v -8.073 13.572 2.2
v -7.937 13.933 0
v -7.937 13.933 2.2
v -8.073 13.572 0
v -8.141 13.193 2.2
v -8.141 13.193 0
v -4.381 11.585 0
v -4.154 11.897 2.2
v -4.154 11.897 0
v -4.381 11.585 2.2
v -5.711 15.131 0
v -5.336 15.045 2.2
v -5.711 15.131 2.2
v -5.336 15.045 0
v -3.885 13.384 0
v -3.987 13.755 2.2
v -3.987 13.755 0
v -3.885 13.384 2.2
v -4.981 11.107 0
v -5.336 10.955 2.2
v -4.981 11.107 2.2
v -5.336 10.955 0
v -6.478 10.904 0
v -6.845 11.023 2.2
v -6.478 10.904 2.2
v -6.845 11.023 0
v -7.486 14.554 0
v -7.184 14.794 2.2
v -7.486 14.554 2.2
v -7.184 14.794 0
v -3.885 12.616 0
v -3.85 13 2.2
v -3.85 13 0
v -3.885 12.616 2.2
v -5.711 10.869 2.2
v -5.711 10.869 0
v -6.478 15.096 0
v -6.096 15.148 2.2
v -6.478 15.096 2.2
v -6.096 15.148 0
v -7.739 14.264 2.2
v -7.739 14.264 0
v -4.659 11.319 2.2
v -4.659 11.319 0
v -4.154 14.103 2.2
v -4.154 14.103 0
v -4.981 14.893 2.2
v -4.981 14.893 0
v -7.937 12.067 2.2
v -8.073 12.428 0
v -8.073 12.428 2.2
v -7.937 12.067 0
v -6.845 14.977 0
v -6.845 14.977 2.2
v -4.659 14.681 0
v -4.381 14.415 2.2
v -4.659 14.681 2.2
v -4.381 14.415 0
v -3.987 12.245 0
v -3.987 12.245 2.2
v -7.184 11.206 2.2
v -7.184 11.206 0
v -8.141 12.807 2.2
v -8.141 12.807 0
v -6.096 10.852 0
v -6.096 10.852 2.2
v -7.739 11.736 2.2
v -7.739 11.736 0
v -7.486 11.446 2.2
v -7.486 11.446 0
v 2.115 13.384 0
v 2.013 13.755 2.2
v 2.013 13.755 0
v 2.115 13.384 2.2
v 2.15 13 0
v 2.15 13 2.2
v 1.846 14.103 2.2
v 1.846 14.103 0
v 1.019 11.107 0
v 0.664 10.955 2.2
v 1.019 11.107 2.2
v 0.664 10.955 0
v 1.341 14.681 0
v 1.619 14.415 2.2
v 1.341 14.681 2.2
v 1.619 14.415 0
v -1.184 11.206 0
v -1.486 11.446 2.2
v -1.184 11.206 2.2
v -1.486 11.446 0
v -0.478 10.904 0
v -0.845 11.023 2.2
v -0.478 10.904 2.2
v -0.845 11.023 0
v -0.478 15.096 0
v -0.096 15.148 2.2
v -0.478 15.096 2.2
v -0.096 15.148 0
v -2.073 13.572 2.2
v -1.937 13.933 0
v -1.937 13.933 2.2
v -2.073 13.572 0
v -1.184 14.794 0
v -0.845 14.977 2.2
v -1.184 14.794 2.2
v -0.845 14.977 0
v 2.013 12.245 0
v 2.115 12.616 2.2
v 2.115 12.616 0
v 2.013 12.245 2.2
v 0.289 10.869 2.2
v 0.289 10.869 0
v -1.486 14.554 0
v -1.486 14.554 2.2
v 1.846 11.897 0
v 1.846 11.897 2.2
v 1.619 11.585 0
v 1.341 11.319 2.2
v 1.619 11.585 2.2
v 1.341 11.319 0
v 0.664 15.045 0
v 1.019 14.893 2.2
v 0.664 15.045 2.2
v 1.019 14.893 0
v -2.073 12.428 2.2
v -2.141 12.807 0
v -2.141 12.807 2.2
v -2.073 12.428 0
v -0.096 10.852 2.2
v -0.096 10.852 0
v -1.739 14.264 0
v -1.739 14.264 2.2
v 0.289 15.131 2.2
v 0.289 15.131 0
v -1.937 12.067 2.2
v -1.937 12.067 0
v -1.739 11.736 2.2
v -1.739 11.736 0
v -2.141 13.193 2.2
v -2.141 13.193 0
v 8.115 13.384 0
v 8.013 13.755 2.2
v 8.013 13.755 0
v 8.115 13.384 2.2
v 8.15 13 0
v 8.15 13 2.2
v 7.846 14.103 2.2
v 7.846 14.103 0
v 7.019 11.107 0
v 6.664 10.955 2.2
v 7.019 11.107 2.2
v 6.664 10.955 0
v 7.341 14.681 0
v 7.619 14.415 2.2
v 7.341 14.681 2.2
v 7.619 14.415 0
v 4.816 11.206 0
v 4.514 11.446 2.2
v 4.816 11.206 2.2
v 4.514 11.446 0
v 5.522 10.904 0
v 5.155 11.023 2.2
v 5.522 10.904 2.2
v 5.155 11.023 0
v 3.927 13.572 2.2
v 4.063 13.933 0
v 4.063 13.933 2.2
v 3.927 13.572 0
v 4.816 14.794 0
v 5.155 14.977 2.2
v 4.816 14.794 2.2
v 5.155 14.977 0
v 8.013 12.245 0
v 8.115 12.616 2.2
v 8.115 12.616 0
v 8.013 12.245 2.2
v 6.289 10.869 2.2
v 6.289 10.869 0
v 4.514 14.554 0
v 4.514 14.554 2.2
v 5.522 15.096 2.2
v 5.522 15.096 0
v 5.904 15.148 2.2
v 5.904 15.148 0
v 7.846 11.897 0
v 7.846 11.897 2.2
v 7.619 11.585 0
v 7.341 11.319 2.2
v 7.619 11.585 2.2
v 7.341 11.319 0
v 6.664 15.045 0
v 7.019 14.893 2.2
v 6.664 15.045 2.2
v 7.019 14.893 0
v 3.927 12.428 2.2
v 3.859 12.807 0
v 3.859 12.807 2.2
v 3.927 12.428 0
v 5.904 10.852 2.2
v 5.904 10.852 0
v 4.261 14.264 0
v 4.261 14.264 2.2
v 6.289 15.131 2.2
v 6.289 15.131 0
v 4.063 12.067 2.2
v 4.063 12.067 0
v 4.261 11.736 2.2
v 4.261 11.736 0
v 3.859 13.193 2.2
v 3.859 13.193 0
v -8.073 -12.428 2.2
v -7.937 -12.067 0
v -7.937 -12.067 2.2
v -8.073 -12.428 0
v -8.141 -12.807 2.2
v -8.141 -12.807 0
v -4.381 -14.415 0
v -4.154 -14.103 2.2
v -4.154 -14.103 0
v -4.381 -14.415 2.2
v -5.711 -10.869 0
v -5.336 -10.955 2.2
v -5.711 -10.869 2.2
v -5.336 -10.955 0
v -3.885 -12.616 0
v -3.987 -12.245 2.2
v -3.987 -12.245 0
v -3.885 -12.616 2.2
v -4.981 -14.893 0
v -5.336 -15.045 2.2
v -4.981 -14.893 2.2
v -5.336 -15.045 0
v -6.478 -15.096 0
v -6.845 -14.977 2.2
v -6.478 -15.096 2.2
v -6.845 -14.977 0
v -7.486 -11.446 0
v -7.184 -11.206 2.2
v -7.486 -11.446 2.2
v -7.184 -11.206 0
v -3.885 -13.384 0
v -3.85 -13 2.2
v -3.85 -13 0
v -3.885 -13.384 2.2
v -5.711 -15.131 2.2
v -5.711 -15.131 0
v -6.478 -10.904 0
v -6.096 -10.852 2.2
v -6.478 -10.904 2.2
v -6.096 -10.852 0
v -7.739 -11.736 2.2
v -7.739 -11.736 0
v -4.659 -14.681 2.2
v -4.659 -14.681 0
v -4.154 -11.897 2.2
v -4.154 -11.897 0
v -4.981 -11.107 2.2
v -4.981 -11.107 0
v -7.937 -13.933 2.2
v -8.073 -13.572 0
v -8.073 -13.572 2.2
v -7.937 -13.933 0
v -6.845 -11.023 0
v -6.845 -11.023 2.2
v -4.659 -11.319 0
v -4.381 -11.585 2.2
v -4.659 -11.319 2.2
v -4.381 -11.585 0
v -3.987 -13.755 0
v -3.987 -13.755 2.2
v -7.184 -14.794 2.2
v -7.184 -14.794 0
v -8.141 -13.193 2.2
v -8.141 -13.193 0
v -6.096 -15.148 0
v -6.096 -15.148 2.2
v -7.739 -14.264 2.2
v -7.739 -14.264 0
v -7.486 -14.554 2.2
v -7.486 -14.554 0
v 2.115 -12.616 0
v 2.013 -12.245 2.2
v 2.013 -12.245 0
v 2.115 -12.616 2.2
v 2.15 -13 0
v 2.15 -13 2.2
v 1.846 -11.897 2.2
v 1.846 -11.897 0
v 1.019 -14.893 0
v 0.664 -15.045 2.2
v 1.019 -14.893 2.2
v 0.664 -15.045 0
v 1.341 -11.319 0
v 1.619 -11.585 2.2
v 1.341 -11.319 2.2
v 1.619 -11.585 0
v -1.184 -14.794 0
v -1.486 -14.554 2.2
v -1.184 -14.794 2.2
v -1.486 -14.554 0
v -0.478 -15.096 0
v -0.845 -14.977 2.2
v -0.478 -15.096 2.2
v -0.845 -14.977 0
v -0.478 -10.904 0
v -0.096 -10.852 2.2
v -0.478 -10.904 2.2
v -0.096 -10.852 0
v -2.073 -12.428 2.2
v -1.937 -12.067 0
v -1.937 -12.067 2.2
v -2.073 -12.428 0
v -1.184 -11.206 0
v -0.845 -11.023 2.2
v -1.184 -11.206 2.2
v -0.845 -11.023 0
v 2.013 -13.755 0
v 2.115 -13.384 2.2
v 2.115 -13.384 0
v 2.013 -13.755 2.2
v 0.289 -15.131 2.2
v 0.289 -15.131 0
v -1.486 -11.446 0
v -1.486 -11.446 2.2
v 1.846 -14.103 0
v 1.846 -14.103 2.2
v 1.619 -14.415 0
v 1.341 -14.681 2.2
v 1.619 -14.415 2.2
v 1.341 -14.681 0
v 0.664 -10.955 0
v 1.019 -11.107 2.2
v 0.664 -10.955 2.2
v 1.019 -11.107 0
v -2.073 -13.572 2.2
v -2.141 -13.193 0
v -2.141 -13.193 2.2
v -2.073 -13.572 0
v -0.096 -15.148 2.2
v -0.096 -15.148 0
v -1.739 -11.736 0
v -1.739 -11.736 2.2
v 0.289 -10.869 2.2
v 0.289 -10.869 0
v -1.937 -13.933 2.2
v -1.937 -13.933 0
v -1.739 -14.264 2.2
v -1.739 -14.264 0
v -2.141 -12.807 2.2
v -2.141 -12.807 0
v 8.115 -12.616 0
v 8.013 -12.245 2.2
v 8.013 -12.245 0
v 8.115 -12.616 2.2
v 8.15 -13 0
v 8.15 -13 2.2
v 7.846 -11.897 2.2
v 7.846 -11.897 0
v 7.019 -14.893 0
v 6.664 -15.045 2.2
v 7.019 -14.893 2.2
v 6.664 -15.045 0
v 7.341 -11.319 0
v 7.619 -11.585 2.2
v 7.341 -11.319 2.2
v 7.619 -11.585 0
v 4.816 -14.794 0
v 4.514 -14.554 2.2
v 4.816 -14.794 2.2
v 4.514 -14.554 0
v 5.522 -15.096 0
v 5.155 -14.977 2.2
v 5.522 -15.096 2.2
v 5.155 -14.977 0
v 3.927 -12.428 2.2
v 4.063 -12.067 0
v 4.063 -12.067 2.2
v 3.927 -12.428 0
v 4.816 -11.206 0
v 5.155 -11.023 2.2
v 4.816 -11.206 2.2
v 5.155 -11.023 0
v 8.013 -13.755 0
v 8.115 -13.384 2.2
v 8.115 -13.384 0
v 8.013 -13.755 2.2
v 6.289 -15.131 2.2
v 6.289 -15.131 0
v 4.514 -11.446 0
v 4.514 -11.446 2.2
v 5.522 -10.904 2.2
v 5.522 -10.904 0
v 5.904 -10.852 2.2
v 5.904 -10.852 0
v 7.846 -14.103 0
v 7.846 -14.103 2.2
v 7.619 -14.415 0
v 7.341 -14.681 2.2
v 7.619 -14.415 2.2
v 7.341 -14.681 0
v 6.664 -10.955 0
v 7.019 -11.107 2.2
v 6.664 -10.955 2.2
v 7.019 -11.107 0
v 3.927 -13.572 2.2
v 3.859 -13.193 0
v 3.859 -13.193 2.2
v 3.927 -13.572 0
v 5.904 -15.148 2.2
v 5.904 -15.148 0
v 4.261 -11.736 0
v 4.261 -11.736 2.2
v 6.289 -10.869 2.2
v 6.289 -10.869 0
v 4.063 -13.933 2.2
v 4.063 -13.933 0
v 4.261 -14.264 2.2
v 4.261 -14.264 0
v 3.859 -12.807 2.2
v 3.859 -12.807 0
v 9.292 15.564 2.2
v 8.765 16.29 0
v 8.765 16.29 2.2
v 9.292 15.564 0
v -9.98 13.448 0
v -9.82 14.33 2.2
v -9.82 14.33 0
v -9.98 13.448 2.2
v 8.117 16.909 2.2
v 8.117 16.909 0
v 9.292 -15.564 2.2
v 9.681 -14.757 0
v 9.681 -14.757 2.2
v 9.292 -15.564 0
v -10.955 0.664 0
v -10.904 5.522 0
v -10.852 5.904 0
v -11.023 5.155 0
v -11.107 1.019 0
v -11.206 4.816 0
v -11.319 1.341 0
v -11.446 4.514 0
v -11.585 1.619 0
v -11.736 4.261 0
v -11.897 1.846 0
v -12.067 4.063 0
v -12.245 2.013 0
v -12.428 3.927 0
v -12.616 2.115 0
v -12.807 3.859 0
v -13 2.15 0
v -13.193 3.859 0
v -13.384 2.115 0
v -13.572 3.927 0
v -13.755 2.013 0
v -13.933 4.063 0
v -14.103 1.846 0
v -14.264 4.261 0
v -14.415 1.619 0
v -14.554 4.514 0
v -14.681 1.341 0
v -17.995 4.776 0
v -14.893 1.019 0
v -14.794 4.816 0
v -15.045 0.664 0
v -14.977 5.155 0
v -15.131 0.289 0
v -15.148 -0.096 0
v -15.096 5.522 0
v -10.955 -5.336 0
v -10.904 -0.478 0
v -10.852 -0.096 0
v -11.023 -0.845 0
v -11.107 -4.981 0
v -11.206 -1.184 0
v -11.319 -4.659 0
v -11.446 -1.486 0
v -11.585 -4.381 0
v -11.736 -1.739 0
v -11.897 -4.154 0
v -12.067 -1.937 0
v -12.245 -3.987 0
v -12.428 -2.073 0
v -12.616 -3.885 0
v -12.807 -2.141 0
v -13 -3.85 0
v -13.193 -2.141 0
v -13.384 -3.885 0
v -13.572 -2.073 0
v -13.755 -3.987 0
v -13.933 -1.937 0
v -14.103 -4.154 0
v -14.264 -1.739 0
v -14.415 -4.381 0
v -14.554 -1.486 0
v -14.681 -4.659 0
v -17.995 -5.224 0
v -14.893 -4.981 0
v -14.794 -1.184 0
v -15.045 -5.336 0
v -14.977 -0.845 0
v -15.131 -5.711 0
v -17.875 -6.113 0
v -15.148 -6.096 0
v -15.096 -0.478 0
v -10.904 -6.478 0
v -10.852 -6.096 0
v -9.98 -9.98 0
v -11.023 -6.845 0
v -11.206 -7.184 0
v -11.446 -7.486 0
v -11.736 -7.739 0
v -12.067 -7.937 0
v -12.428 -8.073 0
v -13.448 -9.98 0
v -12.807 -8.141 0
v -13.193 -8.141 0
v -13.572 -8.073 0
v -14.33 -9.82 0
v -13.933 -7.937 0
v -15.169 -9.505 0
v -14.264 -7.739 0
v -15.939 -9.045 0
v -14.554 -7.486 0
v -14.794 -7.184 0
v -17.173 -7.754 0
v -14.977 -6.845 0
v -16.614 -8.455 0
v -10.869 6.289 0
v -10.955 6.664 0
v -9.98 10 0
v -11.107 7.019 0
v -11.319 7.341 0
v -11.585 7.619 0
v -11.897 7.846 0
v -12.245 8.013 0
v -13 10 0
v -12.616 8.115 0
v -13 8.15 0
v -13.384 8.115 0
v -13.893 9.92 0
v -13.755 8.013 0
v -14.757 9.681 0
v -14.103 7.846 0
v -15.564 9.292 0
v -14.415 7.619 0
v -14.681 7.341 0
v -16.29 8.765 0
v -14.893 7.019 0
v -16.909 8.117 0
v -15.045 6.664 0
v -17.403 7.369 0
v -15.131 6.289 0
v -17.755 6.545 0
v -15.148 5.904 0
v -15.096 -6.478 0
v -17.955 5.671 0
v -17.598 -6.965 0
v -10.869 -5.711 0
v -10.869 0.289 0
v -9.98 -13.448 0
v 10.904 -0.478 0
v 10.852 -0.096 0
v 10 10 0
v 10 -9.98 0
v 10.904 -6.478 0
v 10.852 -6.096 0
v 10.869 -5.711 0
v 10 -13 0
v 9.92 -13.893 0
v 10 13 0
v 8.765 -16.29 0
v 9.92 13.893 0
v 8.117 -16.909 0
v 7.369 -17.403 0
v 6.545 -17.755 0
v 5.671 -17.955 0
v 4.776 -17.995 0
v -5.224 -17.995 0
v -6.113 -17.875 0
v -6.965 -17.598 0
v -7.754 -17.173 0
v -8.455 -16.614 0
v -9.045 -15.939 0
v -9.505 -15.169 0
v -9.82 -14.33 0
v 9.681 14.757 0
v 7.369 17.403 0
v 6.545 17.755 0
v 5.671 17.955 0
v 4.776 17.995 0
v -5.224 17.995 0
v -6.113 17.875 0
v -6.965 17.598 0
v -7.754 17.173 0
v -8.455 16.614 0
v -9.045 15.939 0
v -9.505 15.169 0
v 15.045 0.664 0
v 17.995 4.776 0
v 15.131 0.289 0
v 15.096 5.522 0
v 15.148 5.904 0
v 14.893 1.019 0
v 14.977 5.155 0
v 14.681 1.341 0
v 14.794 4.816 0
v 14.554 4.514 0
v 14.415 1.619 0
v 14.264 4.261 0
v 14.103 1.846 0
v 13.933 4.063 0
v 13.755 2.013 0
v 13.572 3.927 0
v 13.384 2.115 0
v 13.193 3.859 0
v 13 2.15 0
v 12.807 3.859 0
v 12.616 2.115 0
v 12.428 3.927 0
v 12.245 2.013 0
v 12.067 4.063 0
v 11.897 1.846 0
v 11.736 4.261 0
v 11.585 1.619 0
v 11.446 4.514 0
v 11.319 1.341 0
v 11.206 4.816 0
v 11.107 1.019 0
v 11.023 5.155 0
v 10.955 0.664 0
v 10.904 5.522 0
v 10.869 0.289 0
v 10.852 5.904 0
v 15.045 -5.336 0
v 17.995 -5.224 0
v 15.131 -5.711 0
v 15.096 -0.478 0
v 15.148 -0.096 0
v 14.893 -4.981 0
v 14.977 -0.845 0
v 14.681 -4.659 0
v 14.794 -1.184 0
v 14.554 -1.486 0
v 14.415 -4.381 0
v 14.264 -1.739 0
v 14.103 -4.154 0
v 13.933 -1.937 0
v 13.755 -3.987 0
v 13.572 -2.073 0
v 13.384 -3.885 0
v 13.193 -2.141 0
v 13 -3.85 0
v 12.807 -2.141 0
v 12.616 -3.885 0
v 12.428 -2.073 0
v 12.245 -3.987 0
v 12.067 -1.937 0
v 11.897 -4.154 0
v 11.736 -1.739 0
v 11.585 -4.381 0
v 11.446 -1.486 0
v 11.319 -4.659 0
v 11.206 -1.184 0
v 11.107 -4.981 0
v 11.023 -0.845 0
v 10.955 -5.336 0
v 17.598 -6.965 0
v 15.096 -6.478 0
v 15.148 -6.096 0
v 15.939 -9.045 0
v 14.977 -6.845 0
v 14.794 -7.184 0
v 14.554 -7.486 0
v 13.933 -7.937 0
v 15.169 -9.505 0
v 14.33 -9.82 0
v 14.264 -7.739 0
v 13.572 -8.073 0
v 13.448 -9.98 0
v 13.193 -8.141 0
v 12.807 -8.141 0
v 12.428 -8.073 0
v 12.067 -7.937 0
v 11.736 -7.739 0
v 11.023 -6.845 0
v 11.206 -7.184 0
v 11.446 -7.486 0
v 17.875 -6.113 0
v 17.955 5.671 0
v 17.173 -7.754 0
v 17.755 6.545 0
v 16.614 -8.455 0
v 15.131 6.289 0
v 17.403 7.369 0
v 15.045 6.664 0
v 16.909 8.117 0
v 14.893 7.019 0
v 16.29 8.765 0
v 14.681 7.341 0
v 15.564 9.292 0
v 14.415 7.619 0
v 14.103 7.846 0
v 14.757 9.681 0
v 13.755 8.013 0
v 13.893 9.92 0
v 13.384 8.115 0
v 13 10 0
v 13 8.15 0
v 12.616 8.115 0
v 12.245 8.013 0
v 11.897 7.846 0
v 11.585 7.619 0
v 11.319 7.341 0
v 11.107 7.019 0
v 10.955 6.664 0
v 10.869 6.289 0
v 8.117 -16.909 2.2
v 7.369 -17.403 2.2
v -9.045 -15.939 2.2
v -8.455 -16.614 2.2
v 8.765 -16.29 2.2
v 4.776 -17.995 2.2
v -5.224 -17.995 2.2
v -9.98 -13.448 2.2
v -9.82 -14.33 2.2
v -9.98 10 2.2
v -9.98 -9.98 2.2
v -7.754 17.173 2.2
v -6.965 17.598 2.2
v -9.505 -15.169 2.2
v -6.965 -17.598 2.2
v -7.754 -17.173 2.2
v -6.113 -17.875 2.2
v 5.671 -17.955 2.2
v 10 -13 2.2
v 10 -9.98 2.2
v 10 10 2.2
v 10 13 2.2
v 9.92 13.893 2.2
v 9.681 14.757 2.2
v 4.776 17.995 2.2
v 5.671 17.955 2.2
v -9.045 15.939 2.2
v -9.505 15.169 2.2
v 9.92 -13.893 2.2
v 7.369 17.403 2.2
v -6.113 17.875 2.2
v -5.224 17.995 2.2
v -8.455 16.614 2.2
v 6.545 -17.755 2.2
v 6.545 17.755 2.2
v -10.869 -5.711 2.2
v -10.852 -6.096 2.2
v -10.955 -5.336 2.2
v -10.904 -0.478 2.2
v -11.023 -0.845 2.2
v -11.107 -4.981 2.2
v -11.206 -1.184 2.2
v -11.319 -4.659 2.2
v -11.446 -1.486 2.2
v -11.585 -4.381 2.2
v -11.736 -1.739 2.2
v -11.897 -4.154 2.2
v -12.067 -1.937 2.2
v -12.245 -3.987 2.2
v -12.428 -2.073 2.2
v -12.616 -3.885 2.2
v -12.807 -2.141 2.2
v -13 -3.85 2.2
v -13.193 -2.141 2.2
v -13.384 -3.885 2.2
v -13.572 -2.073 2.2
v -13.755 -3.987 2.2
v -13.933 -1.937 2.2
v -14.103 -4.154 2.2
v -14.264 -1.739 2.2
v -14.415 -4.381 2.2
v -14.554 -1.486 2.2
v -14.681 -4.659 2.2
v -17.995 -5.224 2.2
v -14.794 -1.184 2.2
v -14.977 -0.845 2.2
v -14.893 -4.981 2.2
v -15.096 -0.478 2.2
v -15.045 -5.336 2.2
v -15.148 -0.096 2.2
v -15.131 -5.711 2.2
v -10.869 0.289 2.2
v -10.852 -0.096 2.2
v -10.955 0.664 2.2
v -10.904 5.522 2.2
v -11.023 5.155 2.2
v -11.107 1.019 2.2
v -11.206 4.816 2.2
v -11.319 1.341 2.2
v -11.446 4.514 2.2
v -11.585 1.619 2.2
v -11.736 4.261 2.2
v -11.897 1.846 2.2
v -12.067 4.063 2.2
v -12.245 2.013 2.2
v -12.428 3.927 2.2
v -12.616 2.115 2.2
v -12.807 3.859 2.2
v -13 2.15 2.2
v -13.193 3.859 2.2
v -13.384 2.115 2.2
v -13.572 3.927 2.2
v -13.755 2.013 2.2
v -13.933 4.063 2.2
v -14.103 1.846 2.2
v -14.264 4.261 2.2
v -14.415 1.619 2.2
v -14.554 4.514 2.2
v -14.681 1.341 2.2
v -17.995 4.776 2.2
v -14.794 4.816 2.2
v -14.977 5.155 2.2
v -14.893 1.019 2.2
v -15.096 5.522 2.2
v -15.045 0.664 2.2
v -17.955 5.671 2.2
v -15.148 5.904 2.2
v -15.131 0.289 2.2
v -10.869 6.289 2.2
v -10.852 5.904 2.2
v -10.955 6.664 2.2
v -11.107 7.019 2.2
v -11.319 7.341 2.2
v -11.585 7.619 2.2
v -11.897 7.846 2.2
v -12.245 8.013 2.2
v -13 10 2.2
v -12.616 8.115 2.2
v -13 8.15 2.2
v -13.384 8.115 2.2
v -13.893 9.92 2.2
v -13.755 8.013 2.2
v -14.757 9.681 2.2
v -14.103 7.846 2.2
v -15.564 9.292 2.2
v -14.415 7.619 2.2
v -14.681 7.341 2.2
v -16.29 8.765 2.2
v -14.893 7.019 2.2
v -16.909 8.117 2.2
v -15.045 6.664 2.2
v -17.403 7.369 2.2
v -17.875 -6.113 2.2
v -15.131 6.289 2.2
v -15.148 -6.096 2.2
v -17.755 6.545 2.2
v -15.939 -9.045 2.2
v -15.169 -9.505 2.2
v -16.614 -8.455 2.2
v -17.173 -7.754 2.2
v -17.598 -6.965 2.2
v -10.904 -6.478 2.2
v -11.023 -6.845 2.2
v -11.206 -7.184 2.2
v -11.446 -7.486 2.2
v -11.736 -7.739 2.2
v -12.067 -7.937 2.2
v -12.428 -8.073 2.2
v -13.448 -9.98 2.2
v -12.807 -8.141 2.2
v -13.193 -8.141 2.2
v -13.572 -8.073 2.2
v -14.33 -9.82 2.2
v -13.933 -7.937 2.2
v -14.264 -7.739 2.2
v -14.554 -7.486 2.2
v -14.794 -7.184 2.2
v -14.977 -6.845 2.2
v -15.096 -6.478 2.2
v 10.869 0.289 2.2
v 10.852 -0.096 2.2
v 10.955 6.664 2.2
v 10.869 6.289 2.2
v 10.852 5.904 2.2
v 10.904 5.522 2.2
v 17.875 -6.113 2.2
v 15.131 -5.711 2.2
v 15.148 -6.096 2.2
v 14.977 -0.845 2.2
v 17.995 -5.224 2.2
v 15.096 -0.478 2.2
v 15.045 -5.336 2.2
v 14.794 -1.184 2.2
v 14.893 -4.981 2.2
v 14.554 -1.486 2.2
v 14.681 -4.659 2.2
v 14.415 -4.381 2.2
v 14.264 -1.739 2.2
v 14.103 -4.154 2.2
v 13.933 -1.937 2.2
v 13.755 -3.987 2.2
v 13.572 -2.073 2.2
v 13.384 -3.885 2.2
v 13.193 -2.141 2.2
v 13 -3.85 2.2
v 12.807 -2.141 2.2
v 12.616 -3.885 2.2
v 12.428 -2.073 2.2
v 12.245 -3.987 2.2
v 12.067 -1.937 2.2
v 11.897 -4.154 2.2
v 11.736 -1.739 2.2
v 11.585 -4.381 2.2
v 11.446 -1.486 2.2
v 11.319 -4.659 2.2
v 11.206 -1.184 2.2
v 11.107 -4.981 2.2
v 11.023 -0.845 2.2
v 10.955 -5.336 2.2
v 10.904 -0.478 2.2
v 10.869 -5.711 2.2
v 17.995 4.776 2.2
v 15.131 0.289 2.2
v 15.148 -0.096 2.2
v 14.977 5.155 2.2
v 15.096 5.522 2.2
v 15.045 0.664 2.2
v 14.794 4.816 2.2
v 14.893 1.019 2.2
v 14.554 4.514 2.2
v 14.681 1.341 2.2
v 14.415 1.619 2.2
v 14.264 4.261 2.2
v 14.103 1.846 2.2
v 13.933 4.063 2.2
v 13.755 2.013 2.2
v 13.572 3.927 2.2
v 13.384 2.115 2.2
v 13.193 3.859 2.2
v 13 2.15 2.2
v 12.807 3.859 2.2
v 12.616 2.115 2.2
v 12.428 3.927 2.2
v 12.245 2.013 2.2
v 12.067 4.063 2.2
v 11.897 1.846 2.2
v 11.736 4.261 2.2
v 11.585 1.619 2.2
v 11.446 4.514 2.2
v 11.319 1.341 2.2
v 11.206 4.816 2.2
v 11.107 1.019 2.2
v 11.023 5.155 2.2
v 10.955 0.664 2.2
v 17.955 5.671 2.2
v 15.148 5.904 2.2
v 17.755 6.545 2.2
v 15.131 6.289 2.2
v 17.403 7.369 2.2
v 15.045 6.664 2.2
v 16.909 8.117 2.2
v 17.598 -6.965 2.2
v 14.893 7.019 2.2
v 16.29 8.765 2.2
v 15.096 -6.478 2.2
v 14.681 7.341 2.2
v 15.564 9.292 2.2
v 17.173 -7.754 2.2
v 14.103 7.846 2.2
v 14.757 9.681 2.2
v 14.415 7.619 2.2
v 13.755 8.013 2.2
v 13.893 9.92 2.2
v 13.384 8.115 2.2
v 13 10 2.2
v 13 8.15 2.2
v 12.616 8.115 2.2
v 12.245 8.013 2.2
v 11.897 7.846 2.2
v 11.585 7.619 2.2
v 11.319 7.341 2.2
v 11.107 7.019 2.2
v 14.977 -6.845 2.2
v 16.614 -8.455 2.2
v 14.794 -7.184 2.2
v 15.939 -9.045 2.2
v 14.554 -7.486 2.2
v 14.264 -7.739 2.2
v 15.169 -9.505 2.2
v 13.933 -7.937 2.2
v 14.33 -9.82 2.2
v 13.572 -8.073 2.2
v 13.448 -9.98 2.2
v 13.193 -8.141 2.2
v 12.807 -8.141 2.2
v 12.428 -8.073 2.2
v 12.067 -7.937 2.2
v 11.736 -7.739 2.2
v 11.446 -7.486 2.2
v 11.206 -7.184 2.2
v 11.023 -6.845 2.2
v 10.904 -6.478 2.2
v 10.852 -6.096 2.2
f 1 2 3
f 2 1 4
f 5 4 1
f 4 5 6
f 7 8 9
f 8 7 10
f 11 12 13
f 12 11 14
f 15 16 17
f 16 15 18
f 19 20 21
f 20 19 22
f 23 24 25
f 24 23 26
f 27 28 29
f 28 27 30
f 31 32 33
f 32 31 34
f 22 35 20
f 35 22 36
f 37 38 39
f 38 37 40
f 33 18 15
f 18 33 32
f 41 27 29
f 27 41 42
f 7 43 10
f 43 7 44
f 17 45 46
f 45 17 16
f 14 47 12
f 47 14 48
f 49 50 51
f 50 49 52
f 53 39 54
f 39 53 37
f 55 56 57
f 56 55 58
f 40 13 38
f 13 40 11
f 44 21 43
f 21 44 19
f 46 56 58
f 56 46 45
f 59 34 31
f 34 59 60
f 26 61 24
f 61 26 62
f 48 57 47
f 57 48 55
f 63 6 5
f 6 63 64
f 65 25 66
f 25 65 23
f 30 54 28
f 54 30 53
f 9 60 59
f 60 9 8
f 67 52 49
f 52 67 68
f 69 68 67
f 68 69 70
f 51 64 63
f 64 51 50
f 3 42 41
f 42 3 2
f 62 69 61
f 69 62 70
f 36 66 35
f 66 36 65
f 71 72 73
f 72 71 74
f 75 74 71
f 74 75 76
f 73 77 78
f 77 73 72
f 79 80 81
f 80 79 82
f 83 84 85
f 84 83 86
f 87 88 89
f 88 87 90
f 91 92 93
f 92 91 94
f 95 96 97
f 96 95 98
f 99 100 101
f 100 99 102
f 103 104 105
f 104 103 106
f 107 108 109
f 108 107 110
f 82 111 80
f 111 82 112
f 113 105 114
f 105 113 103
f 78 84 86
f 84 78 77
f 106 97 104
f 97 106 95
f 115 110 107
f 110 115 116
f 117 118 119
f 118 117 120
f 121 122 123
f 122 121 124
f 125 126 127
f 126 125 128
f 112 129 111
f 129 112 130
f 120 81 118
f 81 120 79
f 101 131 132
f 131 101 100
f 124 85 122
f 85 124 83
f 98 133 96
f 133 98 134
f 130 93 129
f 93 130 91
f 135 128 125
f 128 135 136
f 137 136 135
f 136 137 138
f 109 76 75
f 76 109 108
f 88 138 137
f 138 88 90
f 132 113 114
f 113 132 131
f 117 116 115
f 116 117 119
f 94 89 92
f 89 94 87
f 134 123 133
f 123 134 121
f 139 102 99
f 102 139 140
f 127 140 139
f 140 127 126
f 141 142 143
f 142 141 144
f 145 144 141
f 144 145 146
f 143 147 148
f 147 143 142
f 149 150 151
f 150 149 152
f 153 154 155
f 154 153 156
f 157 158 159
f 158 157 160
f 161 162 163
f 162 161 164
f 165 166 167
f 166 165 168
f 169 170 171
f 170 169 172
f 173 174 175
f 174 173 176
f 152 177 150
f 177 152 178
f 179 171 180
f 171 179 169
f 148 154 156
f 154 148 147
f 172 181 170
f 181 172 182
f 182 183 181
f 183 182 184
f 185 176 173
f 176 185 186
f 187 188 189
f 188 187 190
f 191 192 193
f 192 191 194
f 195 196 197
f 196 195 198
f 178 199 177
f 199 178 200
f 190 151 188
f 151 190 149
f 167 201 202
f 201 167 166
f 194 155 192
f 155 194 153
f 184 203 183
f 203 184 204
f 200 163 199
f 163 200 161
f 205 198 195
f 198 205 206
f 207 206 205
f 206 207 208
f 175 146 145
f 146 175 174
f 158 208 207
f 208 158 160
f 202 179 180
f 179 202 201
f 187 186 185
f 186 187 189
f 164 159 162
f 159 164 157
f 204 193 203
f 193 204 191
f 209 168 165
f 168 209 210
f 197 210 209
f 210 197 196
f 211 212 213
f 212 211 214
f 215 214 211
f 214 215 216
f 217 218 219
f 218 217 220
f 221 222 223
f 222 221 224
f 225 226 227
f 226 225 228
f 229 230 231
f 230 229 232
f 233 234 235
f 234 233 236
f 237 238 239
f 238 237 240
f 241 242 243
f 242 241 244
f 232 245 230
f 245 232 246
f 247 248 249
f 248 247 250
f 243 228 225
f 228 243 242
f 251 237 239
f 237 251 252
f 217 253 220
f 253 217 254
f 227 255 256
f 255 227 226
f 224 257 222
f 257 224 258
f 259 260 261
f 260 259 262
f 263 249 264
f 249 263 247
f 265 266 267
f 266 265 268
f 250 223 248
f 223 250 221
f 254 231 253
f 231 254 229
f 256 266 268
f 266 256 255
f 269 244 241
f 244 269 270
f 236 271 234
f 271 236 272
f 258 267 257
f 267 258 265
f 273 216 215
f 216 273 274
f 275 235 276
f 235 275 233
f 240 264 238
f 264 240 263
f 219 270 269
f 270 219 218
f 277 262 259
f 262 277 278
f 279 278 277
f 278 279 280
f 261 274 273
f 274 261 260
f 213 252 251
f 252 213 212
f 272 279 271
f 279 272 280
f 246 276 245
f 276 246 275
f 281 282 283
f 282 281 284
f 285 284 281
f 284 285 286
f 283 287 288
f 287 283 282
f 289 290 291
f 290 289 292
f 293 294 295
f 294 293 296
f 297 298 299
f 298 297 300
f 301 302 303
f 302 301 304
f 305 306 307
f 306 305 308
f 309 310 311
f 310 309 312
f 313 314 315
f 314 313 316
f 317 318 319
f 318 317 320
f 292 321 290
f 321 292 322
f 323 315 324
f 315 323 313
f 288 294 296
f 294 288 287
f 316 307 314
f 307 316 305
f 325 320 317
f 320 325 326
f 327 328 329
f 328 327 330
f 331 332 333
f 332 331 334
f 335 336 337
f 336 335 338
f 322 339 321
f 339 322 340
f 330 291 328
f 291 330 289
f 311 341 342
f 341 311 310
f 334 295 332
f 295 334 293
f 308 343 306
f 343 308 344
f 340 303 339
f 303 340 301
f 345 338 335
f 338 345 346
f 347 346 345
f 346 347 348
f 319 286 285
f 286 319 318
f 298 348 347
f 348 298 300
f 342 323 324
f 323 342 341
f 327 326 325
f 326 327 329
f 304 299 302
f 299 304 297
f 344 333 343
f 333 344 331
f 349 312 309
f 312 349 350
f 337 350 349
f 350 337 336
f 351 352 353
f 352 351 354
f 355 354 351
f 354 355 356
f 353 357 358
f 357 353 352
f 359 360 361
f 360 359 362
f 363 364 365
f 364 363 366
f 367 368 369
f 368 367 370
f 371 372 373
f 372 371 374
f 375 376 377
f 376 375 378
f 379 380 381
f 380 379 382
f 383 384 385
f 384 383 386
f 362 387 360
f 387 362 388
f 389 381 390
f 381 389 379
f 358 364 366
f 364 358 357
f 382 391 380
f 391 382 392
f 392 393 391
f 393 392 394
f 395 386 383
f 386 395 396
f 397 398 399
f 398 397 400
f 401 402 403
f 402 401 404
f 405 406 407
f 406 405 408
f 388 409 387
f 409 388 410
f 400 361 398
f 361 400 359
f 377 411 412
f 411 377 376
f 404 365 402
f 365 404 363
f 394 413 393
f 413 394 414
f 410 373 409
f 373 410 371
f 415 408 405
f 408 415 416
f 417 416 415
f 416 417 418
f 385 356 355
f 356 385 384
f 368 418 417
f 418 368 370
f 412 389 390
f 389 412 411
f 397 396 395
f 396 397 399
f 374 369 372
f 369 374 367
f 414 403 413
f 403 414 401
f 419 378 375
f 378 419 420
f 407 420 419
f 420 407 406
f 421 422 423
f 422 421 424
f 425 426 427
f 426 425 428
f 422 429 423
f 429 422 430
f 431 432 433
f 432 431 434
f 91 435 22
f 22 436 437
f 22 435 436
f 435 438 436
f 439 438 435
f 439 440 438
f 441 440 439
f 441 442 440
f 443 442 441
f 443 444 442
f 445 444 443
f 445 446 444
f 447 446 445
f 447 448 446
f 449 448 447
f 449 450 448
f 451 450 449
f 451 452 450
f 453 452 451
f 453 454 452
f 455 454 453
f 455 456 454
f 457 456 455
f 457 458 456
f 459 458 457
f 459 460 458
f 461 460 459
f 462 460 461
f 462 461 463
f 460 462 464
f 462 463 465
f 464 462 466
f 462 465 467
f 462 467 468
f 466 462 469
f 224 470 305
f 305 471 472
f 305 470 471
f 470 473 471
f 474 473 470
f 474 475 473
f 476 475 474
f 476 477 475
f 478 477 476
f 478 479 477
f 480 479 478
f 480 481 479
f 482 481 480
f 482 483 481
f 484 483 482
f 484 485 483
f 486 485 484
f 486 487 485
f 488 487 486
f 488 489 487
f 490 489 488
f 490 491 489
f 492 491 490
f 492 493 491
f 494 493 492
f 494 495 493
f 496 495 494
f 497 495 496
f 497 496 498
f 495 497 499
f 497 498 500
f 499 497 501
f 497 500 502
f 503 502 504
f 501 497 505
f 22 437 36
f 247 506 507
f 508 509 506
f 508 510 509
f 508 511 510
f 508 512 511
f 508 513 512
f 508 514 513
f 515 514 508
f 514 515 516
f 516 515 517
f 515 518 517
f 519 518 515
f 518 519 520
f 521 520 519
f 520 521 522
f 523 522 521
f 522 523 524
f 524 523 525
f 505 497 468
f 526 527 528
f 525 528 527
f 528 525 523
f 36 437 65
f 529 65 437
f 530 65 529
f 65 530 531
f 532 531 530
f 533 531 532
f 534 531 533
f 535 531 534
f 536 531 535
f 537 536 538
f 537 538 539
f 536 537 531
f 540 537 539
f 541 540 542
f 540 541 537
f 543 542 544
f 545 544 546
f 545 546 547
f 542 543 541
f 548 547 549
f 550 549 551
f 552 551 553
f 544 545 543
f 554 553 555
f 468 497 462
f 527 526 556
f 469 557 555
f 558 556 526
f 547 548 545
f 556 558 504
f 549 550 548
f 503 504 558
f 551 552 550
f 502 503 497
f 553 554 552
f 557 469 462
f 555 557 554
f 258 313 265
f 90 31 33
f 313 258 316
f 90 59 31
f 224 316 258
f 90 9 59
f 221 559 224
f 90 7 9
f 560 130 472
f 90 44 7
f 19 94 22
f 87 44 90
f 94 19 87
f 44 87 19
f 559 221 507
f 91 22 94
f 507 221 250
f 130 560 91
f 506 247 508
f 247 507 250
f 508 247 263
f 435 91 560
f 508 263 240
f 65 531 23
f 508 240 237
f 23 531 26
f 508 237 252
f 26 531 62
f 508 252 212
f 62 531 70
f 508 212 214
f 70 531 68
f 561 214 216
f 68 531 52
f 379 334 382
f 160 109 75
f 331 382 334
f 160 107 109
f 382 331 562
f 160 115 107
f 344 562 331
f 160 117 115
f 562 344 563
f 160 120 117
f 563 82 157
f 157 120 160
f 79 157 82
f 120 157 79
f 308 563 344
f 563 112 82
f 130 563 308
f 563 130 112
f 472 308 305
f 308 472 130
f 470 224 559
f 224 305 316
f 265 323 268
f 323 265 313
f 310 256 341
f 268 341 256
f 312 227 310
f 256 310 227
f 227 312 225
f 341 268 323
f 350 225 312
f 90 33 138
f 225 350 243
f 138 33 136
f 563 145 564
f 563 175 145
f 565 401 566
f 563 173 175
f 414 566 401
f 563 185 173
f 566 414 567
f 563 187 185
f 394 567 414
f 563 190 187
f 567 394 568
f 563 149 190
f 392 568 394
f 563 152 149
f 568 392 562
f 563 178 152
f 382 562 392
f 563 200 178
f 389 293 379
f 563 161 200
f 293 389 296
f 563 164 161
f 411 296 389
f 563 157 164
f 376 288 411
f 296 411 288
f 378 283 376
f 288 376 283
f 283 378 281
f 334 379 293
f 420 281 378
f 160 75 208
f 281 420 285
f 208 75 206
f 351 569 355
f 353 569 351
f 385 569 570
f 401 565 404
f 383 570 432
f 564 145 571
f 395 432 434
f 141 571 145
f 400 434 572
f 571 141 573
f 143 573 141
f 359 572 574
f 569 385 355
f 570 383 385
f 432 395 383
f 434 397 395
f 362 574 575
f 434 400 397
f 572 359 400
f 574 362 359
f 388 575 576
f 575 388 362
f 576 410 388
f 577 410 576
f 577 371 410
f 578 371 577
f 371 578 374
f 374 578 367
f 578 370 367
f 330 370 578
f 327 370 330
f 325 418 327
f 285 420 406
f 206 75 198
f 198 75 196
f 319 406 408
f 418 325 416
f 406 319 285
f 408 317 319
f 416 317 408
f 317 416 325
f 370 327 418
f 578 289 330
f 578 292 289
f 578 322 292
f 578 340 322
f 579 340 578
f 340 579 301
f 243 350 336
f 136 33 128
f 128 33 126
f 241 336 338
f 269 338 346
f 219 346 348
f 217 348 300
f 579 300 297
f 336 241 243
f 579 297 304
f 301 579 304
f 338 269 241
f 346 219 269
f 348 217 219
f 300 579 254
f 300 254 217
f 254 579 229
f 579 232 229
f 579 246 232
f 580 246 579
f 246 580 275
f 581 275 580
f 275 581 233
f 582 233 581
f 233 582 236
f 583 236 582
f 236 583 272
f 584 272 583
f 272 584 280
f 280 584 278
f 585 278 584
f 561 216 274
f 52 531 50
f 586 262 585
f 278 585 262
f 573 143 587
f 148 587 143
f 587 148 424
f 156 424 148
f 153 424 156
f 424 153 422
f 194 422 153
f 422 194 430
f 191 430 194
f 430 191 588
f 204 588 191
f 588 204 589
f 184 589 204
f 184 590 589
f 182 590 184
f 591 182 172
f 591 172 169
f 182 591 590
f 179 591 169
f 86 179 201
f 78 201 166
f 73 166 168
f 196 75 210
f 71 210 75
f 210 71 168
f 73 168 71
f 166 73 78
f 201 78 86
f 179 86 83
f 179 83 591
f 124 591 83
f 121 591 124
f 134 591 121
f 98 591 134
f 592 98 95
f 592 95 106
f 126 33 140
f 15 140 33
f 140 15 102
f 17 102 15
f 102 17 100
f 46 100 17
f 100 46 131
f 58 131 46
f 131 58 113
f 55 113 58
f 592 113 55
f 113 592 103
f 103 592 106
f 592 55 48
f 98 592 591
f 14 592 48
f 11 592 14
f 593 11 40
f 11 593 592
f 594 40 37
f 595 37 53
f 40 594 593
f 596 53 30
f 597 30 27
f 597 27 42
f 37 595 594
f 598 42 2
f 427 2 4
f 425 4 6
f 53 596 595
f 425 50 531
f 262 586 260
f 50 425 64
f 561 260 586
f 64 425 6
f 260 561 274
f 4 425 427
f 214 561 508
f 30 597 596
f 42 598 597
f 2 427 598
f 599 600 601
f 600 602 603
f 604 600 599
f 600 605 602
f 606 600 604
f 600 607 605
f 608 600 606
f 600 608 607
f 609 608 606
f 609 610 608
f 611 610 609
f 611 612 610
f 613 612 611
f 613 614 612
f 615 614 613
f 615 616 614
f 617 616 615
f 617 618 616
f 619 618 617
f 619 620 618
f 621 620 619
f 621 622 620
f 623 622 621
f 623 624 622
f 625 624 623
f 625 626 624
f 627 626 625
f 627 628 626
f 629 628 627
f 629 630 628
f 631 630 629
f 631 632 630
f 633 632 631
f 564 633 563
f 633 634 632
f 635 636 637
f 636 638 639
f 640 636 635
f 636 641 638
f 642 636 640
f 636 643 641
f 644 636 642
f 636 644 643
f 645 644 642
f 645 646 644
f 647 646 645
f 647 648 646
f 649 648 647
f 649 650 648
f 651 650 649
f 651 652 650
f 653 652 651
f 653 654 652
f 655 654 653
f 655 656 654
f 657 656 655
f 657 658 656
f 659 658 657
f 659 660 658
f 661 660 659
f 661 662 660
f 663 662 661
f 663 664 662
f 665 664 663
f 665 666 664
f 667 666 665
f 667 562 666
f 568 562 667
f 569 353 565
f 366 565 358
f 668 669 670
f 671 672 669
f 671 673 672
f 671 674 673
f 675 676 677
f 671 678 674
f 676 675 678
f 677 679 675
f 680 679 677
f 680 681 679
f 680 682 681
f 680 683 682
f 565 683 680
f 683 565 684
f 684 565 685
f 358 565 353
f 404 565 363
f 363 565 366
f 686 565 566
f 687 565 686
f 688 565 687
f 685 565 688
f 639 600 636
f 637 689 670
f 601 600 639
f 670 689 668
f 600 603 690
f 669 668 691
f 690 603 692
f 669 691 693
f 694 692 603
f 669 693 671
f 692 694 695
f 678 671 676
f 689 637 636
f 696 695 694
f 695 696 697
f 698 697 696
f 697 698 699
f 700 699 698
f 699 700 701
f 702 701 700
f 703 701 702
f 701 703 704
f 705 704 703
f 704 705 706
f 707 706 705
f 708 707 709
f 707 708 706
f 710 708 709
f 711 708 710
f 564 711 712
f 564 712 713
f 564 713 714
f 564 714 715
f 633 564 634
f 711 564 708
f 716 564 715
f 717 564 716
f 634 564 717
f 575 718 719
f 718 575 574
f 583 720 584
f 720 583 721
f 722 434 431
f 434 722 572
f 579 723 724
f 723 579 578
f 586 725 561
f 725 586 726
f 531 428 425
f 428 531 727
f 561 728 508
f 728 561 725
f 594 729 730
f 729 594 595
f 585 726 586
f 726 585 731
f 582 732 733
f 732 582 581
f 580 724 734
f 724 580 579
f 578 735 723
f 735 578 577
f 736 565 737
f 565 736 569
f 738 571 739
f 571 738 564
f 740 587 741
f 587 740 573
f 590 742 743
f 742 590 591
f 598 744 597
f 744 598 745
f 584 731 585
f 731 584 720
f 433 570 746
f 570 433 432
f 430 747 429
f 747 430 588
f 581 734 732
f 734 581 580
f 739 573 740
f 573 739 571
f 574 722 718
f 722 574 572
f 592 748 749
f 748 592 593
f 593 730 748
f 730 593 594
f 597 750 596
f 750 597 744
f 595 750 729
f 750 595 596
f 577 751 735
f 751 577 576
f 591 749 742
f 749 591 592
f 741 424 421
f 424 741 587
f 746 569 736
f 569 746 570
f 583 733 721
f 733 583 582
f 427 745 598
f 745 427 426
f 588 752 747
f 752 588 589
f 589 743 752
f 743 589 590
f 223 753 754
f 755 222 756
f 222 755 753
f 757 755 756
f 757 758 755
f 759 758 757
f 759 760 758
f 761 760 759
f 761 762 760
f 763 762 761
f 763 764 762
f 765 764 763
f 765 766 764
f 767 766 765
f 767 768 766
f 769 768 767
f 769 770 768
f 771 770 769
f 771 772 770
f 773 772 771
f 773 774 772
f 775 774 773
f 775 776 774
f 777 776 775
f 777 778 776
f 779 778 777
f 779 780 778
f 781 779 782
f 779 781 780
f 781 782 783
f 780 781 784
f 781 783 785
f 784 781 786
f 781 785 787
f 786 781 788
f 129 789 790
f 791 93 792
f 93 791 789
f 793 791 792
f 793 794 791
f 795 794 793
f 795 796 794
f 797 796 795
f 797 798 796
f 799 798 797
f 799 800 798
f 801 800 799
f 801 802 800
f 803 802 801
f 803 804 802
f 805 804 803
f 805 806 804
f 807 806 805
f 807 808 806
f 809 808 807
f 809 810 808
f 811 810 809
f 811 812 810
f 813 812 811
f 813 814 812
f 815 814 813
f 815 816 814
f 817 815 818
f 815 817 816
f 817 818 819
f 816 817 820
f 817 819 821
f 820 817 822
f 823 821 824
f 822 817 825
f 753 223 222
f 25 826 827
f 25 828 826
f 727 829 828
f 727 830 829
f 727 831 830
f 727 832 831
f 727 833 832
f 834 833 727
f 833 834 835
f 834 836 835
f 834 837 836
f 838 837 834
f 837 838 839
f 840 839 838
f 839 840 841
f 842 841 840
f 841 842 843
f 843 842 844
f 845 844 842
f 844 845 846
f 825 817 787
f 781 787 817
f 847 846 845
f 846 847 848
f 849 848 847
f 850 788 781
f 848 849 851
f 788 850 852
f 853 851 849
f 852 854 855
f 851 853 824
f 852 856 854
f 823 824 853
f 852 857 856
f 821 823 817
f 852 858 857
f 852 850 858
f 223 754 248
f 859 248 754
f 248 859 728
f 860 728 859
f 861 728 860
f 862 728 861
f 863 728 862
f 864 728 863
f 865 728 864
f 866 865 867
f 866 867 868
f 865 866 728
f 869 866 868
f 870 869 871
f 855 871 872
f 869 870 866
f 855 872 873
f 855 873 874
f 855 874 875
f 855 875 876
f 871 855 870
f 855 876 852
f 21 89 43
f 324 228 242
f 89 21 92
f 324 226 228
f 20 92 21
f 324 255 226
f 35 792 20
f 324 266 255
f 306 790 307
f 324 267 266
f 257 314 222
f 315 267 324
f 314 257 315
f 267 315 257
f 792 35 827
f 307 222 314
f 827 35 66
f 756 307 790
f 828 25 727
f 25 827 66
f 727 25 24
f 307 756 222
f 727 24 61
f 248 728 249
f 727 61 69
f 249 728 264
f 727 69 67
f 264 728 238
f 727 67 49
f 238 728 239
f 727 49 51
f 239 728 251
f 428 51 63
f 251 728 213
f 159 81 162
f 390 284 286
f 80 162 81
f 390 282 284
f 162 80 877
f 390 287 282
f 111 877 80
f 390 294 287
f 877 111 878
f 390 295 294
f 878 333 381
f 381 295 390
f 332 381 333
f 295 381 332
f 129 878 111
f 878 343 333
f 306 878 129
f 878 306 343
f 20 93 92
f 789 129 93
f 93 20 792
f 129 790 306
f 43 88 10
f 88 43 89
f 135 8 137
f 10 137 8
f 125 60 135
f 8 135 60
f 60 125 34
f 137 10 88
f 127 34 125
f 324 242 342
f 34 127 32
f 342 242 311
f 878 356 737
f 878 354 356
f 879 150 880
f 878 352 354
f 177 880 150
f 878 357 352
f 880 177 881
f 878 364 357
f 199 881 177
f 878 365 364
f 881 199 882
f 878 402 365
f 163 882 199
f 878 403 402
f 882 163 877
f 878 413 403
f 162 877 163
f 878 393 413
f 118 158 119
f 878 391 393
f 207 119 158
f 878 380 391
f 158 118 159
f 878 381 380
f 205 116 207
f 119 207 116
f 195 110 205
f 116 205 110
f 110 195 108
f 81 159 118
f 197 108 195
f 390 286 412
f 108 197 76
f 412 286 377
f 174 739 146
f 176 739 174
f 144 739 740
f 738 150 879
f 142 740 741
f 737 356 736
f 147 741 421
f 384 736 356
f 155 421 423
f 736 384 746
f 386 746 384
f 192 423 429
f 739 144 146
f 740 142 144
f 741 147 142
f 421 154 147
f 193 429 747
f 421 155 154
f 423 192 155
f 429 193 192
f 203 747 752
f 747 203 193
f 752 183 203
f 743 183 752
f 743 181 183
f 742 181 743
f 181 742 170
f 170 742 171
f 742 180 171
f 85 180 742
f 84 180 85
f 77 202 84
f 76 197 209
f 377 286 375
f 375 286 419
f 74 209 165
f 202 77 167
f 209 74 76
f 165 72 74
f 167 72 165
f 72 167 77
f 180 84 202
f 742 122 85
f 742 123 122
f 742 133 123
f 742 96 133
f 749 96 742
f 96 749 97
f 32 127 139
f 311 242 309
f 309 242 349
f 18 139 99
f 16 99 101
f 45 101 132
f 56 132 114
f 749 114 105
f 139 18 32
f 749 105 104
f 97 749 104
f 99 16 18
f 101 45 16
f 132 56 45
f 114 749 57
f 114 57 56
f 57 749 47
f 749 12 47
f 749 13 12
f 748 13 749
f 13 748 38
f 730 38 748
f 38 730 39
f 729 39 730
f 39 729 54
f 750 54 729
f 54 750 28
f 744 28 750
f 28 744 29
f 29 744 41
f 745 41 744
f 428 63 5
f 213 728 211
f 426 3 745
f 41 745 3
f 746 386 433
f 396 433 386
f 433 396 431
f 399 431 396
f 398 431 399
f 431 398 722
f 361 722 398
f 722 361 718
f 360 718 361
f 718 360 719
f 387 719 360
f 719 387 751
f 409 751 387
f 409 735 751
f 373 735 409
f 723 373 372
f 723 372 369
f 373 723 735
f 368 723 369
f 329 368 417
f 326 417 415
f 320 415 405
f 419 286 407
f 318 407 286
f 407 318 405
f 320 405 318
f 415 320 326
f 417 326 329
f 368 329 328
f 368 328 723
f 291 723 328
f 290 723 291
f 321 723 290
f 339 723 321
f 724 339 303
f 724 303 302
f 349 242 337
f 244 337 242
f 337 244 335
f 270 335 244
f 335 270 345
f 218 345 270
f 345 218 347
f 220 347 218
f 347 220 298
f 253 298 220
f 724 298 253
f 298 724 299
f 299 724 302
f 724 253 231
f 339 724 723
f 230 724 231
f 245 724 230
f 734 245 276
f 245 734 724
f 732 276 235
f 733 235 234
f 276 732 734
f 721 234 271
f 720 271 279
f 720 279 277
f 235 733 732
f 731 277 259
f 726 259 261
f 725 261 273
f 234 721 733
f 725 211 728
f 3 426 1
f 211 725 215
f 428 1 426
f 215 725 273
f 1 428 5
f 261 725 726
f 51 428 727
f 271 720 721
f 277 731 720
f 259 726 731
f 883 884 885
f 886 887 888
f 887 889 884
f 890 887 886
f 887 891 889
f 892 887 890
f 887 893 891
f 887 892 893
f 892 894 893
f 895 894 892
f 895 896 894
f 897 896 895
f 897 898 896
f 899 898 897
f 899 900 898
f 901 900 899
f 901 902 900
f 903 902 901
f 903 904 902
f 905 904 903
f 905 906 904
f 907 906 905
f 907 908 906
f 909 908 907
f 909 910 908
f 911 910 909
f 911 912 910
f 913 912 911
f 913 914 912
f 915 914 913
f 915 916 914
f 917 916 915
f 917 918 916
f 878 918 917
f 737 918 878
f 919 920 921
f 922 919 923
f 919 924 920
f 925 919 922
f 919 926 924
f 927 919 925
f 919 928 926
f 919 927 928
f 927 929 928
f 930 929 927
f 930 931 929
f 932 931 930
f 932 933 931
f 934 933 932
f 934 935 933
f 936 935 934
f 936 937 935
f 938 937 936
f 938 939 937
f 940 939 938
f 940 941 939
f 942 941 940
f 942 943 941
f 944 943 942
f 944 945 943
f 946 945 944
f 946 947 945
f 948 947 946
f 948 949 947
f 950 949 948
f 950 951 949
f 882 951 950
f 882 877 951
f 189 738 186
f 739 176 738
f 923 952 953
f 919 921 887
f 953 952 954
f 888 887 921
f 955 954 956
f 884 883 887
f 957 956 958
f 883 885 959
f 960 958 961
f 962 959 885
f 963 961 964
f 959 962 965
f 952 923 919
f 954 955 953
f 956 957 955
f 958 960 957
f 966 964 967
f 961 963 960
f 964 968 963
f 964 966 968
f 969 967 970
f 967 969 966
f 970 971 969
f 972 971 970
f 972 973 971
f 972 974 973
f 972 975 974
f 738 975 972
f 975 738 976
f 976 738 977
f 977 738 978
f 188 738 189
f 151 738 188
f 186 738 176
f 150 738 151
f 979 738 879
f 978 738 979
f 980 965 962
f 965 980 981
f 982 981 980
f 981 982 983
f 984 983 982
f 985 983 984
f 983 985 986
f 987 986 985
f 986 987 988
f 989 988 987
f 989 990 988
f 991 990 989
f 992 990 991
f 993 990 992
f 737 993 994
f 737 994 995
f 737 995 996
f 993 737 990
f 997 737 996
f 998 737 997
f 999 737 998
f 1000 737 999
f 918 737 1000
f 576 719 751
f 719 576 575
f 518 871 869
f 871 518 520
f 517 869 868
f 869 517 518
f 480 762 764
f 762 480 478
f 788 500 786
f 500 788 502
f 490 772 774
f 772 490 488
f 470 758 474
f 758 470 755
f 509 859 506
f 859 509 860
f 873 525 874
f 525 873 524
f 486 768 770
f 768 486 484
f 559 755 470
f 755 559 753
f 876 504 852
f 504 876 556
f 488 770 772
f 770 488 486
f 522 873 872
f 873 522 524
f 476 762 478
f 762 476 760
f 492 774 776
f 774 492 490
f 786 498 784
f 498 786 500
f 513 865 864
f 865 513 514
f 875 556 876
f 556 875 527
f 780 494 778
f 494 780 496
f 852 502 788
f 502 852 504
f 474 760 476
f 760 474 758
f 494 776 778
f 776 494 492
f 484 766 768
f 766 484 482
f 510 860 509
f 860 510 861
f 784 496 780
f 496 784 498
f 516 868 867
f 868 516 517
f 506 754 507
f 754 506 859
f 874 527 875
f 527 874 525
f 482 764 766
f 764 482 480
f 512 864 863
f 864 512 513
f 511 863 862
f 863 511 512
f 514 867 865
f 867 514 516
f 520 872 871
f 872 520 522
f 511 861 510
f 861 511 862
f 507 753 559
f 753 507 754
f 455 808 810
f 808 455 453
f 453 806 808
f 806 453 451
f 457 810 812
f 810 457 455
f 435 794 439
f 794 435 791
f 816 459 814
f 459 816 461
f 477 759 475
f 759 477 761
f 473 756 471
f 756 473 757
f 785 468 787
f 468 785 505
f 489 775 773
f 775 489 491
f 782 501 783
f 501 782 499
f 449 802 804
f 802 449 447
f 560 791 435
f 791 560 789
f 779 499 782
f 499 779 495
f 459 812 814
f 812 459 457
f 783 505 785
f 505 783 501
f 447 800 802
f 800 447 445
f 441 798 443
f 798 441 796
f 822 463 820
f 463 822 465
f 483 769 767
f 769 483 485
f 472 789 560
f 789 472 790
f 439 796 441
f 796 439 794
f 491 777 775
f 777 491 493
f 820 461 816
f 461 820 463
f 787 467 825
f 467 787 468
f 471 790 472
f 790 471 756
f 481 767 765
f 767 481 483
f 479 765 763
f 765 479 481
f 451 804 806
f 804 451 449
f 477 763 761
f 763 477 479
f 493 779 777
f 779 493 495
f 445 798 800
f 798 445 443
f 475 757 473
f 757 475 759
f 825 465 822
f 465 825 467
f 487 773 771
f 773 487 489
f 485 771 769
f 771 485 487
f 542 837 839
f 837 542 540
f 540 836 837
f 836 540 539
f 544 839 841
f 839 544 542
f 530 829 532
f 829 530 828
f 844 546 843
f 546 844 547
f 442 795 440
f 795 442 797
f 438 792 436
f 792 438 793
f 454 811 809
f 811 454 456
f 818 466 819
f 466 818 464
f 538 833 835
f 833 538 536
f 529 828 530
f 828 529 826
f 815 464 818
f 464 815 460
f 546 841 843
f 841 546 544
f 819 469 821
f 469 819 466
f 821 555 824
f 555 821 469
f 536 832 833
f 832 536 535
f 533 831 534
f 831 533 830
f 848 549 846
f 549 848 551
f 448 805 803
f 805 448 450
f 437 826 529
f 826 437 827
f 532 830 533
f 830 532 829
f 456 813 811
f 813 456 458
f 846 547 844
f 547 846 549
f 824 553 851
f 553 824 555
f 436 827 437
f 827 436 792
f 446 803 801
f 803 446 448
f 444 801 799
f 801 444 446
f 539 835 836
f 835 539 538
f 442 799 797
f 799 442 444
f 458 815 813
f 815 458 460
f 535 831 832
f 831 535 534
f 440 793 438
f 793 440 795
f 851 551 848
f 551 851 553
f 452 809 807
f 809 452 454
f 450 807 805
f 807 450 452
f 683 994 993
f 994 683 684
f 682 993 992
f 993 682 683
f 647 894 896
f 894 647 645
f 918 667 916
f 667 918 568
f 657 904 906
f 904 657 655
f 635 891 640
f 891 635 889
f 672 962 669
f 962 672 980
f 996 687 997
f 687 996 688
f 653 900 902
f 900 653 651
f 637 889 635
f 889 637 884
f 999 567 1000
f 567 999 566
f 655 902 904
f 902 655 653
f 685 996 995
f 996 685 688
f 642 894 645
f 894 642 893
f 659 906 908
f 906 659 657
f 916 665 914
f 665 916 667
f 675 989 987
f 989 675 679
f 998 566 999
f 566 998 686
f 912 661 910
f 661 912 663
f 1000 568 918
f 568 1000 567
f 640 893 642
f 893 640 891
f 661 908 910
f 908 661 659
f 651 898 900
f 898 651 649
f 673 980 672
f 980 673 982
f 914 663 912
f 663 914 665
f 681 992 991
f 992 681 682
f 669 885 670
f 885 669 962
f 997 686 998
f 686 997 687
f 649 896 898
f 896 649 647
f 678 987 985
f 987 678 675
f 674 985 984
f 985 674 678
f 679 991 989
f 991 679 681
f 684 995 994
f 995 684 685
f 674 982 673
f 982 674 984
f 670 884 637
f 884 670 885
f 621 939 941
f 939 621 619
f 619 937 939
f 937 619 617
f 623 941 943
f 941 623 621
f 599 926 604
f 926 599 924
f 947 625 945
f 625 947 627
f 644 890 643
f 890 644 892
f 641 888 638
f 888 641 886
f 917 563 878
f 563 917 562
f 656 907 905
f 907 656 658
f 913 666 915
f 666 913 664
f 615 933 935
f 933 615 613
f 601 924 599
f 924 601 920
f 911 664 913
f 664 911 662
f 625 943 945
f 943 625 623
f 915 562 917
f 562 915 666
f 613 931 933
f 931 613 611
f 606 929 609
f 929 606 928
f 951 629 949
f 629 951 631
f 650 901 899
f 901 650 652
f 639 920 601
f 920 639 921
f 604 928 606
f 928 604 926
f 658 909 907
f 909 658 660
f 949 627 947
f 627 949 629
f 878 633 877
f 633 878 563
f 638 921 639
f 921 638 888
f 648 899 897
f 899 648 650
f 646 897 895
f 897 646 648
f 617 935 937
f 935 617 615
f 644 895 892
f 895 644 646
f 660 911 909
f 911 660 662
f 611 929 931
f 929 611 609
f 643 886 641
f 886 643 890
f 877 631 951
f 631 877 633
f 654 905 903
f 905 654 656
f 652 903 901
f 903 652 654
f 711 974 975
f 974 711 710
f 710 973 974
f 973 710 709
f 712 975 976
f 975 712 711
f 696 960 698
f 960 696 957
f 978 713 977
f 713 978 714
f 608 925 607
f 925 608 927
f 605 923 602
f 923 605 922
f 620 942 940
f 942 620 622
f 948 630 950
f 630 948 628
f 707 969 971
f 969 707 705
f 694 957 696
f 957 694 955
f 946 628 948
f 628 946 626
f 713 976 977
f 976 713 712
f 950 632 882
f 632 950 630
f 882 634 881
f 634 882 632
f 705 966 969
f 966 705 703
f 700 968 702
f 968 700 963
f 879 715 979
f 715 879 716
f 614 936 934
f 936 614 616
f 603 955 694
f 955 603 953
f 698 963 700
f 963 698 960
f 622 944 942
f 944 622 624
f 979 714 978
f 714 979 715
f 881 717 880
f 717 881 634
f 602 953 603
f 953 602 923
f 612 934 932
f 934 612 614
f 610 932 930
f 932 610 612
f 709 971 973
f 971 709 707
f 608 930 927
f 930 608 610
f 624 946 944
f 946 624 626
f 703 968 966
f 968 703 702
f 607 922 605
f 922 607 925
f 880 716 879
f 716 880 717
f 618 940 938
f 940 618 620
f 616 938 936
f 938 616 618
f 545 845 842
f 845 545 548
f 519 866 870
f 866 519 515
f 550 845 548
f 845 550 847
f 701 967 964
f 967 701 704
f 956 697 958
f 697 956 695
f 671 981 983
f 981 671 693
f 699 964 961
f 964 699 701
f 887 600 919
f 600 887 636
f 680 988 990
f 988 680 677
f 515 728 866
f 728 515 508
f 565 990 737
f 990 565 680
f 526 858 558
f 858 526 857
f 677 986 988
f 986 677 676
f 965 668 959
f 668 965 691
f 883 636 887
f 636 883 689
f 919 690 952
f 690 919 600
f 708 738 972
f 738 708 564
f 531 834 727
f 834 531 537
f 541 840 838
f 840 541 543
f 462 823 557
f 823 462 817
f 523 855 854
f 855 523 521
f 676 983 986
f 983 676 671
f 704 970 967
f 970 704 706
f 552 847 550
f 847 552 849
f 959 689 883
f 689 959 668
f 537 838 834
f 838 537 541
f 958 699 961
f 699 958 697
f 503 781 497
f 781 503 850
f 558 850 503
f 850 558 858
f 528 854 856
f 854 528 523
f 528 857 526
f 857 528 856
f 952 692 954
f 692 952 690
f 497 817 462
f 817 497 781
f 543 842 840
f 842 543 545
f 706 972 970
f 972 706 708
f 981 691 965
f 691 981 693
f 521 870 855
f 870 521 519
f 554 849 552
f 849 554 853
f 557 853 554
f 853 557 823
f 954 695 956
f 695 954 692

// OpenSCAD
// file: common.scad
// Width of plastic
Width = 2.2;

// Color of the parts
PartsColor = [0.8, 0.8, 0.8];

// Diameter of plastic ollo holes
OlloHoles = 4.3;

// Width of Ollo "real" plastic
OlloWidth = 3;

// Motor dimensions
MotorWidth = 24;
MotorHeight = 36;
MotorDepth = 24;
MotorArmOffset = 9;

// U dimensions
UHeight = 10;
URadius = 8;
UWidth = 30+Width/2;
UTotalHeight = UHeight+URadius;

// Side dimensions
SideSize = 38 + 0;
SideHolesToBorder = 5;

// Size of the body
BodySize = 18;

// Defining the resolution
$fn=35;

// Do an Ollo hole on the part
module olloHole(depth=Width)
{
    translate([0,0,-0.1])
      cylinder(depth+0.2, OlloHoles/2, OlloHoles/2);
}

// Do 3 ollo holes
module threeOllo(depth=Width)
{
  for (xy=[[-6,0],[0,0],[6,0]]) {
    translate([xy[0], xy[1], 0])
    olloHole(depth);
  }
}

// Do a servo arm holes
module servoArm(depth=Width)
{
    threeOllo(depth);
    rotate([0,0,90])
      threeOllo(depth);
}

// Do a rounded cube
module rounded(x=10, y=10, z=10, r=3, center=false) {
  if (center) {
    translate([-(x/2),-(y/2),0])
      rounded(x, y, z, r);
  } else {
    translate([r,r,0])
    minkowski() {
      cube([x-2*r,y-2*r,z/2]);
      cylinder(h=z/2, r=r);
    }
  }
}
// main file
include <common.scad>;

module body() {
    module bodyPart() {
        difference() {
            rounded(20, BodySize*2, Width, 5, center=true);
            for (y=[BodySize-5, -BodySize+5]) {
                translate([0, y, 0])
                    threeOllo();
            }
        }
    }

    color(PartsColor) {
        bodyPart();
        rotate([0,0,90])
            bodyPart();
    }
}

body();
